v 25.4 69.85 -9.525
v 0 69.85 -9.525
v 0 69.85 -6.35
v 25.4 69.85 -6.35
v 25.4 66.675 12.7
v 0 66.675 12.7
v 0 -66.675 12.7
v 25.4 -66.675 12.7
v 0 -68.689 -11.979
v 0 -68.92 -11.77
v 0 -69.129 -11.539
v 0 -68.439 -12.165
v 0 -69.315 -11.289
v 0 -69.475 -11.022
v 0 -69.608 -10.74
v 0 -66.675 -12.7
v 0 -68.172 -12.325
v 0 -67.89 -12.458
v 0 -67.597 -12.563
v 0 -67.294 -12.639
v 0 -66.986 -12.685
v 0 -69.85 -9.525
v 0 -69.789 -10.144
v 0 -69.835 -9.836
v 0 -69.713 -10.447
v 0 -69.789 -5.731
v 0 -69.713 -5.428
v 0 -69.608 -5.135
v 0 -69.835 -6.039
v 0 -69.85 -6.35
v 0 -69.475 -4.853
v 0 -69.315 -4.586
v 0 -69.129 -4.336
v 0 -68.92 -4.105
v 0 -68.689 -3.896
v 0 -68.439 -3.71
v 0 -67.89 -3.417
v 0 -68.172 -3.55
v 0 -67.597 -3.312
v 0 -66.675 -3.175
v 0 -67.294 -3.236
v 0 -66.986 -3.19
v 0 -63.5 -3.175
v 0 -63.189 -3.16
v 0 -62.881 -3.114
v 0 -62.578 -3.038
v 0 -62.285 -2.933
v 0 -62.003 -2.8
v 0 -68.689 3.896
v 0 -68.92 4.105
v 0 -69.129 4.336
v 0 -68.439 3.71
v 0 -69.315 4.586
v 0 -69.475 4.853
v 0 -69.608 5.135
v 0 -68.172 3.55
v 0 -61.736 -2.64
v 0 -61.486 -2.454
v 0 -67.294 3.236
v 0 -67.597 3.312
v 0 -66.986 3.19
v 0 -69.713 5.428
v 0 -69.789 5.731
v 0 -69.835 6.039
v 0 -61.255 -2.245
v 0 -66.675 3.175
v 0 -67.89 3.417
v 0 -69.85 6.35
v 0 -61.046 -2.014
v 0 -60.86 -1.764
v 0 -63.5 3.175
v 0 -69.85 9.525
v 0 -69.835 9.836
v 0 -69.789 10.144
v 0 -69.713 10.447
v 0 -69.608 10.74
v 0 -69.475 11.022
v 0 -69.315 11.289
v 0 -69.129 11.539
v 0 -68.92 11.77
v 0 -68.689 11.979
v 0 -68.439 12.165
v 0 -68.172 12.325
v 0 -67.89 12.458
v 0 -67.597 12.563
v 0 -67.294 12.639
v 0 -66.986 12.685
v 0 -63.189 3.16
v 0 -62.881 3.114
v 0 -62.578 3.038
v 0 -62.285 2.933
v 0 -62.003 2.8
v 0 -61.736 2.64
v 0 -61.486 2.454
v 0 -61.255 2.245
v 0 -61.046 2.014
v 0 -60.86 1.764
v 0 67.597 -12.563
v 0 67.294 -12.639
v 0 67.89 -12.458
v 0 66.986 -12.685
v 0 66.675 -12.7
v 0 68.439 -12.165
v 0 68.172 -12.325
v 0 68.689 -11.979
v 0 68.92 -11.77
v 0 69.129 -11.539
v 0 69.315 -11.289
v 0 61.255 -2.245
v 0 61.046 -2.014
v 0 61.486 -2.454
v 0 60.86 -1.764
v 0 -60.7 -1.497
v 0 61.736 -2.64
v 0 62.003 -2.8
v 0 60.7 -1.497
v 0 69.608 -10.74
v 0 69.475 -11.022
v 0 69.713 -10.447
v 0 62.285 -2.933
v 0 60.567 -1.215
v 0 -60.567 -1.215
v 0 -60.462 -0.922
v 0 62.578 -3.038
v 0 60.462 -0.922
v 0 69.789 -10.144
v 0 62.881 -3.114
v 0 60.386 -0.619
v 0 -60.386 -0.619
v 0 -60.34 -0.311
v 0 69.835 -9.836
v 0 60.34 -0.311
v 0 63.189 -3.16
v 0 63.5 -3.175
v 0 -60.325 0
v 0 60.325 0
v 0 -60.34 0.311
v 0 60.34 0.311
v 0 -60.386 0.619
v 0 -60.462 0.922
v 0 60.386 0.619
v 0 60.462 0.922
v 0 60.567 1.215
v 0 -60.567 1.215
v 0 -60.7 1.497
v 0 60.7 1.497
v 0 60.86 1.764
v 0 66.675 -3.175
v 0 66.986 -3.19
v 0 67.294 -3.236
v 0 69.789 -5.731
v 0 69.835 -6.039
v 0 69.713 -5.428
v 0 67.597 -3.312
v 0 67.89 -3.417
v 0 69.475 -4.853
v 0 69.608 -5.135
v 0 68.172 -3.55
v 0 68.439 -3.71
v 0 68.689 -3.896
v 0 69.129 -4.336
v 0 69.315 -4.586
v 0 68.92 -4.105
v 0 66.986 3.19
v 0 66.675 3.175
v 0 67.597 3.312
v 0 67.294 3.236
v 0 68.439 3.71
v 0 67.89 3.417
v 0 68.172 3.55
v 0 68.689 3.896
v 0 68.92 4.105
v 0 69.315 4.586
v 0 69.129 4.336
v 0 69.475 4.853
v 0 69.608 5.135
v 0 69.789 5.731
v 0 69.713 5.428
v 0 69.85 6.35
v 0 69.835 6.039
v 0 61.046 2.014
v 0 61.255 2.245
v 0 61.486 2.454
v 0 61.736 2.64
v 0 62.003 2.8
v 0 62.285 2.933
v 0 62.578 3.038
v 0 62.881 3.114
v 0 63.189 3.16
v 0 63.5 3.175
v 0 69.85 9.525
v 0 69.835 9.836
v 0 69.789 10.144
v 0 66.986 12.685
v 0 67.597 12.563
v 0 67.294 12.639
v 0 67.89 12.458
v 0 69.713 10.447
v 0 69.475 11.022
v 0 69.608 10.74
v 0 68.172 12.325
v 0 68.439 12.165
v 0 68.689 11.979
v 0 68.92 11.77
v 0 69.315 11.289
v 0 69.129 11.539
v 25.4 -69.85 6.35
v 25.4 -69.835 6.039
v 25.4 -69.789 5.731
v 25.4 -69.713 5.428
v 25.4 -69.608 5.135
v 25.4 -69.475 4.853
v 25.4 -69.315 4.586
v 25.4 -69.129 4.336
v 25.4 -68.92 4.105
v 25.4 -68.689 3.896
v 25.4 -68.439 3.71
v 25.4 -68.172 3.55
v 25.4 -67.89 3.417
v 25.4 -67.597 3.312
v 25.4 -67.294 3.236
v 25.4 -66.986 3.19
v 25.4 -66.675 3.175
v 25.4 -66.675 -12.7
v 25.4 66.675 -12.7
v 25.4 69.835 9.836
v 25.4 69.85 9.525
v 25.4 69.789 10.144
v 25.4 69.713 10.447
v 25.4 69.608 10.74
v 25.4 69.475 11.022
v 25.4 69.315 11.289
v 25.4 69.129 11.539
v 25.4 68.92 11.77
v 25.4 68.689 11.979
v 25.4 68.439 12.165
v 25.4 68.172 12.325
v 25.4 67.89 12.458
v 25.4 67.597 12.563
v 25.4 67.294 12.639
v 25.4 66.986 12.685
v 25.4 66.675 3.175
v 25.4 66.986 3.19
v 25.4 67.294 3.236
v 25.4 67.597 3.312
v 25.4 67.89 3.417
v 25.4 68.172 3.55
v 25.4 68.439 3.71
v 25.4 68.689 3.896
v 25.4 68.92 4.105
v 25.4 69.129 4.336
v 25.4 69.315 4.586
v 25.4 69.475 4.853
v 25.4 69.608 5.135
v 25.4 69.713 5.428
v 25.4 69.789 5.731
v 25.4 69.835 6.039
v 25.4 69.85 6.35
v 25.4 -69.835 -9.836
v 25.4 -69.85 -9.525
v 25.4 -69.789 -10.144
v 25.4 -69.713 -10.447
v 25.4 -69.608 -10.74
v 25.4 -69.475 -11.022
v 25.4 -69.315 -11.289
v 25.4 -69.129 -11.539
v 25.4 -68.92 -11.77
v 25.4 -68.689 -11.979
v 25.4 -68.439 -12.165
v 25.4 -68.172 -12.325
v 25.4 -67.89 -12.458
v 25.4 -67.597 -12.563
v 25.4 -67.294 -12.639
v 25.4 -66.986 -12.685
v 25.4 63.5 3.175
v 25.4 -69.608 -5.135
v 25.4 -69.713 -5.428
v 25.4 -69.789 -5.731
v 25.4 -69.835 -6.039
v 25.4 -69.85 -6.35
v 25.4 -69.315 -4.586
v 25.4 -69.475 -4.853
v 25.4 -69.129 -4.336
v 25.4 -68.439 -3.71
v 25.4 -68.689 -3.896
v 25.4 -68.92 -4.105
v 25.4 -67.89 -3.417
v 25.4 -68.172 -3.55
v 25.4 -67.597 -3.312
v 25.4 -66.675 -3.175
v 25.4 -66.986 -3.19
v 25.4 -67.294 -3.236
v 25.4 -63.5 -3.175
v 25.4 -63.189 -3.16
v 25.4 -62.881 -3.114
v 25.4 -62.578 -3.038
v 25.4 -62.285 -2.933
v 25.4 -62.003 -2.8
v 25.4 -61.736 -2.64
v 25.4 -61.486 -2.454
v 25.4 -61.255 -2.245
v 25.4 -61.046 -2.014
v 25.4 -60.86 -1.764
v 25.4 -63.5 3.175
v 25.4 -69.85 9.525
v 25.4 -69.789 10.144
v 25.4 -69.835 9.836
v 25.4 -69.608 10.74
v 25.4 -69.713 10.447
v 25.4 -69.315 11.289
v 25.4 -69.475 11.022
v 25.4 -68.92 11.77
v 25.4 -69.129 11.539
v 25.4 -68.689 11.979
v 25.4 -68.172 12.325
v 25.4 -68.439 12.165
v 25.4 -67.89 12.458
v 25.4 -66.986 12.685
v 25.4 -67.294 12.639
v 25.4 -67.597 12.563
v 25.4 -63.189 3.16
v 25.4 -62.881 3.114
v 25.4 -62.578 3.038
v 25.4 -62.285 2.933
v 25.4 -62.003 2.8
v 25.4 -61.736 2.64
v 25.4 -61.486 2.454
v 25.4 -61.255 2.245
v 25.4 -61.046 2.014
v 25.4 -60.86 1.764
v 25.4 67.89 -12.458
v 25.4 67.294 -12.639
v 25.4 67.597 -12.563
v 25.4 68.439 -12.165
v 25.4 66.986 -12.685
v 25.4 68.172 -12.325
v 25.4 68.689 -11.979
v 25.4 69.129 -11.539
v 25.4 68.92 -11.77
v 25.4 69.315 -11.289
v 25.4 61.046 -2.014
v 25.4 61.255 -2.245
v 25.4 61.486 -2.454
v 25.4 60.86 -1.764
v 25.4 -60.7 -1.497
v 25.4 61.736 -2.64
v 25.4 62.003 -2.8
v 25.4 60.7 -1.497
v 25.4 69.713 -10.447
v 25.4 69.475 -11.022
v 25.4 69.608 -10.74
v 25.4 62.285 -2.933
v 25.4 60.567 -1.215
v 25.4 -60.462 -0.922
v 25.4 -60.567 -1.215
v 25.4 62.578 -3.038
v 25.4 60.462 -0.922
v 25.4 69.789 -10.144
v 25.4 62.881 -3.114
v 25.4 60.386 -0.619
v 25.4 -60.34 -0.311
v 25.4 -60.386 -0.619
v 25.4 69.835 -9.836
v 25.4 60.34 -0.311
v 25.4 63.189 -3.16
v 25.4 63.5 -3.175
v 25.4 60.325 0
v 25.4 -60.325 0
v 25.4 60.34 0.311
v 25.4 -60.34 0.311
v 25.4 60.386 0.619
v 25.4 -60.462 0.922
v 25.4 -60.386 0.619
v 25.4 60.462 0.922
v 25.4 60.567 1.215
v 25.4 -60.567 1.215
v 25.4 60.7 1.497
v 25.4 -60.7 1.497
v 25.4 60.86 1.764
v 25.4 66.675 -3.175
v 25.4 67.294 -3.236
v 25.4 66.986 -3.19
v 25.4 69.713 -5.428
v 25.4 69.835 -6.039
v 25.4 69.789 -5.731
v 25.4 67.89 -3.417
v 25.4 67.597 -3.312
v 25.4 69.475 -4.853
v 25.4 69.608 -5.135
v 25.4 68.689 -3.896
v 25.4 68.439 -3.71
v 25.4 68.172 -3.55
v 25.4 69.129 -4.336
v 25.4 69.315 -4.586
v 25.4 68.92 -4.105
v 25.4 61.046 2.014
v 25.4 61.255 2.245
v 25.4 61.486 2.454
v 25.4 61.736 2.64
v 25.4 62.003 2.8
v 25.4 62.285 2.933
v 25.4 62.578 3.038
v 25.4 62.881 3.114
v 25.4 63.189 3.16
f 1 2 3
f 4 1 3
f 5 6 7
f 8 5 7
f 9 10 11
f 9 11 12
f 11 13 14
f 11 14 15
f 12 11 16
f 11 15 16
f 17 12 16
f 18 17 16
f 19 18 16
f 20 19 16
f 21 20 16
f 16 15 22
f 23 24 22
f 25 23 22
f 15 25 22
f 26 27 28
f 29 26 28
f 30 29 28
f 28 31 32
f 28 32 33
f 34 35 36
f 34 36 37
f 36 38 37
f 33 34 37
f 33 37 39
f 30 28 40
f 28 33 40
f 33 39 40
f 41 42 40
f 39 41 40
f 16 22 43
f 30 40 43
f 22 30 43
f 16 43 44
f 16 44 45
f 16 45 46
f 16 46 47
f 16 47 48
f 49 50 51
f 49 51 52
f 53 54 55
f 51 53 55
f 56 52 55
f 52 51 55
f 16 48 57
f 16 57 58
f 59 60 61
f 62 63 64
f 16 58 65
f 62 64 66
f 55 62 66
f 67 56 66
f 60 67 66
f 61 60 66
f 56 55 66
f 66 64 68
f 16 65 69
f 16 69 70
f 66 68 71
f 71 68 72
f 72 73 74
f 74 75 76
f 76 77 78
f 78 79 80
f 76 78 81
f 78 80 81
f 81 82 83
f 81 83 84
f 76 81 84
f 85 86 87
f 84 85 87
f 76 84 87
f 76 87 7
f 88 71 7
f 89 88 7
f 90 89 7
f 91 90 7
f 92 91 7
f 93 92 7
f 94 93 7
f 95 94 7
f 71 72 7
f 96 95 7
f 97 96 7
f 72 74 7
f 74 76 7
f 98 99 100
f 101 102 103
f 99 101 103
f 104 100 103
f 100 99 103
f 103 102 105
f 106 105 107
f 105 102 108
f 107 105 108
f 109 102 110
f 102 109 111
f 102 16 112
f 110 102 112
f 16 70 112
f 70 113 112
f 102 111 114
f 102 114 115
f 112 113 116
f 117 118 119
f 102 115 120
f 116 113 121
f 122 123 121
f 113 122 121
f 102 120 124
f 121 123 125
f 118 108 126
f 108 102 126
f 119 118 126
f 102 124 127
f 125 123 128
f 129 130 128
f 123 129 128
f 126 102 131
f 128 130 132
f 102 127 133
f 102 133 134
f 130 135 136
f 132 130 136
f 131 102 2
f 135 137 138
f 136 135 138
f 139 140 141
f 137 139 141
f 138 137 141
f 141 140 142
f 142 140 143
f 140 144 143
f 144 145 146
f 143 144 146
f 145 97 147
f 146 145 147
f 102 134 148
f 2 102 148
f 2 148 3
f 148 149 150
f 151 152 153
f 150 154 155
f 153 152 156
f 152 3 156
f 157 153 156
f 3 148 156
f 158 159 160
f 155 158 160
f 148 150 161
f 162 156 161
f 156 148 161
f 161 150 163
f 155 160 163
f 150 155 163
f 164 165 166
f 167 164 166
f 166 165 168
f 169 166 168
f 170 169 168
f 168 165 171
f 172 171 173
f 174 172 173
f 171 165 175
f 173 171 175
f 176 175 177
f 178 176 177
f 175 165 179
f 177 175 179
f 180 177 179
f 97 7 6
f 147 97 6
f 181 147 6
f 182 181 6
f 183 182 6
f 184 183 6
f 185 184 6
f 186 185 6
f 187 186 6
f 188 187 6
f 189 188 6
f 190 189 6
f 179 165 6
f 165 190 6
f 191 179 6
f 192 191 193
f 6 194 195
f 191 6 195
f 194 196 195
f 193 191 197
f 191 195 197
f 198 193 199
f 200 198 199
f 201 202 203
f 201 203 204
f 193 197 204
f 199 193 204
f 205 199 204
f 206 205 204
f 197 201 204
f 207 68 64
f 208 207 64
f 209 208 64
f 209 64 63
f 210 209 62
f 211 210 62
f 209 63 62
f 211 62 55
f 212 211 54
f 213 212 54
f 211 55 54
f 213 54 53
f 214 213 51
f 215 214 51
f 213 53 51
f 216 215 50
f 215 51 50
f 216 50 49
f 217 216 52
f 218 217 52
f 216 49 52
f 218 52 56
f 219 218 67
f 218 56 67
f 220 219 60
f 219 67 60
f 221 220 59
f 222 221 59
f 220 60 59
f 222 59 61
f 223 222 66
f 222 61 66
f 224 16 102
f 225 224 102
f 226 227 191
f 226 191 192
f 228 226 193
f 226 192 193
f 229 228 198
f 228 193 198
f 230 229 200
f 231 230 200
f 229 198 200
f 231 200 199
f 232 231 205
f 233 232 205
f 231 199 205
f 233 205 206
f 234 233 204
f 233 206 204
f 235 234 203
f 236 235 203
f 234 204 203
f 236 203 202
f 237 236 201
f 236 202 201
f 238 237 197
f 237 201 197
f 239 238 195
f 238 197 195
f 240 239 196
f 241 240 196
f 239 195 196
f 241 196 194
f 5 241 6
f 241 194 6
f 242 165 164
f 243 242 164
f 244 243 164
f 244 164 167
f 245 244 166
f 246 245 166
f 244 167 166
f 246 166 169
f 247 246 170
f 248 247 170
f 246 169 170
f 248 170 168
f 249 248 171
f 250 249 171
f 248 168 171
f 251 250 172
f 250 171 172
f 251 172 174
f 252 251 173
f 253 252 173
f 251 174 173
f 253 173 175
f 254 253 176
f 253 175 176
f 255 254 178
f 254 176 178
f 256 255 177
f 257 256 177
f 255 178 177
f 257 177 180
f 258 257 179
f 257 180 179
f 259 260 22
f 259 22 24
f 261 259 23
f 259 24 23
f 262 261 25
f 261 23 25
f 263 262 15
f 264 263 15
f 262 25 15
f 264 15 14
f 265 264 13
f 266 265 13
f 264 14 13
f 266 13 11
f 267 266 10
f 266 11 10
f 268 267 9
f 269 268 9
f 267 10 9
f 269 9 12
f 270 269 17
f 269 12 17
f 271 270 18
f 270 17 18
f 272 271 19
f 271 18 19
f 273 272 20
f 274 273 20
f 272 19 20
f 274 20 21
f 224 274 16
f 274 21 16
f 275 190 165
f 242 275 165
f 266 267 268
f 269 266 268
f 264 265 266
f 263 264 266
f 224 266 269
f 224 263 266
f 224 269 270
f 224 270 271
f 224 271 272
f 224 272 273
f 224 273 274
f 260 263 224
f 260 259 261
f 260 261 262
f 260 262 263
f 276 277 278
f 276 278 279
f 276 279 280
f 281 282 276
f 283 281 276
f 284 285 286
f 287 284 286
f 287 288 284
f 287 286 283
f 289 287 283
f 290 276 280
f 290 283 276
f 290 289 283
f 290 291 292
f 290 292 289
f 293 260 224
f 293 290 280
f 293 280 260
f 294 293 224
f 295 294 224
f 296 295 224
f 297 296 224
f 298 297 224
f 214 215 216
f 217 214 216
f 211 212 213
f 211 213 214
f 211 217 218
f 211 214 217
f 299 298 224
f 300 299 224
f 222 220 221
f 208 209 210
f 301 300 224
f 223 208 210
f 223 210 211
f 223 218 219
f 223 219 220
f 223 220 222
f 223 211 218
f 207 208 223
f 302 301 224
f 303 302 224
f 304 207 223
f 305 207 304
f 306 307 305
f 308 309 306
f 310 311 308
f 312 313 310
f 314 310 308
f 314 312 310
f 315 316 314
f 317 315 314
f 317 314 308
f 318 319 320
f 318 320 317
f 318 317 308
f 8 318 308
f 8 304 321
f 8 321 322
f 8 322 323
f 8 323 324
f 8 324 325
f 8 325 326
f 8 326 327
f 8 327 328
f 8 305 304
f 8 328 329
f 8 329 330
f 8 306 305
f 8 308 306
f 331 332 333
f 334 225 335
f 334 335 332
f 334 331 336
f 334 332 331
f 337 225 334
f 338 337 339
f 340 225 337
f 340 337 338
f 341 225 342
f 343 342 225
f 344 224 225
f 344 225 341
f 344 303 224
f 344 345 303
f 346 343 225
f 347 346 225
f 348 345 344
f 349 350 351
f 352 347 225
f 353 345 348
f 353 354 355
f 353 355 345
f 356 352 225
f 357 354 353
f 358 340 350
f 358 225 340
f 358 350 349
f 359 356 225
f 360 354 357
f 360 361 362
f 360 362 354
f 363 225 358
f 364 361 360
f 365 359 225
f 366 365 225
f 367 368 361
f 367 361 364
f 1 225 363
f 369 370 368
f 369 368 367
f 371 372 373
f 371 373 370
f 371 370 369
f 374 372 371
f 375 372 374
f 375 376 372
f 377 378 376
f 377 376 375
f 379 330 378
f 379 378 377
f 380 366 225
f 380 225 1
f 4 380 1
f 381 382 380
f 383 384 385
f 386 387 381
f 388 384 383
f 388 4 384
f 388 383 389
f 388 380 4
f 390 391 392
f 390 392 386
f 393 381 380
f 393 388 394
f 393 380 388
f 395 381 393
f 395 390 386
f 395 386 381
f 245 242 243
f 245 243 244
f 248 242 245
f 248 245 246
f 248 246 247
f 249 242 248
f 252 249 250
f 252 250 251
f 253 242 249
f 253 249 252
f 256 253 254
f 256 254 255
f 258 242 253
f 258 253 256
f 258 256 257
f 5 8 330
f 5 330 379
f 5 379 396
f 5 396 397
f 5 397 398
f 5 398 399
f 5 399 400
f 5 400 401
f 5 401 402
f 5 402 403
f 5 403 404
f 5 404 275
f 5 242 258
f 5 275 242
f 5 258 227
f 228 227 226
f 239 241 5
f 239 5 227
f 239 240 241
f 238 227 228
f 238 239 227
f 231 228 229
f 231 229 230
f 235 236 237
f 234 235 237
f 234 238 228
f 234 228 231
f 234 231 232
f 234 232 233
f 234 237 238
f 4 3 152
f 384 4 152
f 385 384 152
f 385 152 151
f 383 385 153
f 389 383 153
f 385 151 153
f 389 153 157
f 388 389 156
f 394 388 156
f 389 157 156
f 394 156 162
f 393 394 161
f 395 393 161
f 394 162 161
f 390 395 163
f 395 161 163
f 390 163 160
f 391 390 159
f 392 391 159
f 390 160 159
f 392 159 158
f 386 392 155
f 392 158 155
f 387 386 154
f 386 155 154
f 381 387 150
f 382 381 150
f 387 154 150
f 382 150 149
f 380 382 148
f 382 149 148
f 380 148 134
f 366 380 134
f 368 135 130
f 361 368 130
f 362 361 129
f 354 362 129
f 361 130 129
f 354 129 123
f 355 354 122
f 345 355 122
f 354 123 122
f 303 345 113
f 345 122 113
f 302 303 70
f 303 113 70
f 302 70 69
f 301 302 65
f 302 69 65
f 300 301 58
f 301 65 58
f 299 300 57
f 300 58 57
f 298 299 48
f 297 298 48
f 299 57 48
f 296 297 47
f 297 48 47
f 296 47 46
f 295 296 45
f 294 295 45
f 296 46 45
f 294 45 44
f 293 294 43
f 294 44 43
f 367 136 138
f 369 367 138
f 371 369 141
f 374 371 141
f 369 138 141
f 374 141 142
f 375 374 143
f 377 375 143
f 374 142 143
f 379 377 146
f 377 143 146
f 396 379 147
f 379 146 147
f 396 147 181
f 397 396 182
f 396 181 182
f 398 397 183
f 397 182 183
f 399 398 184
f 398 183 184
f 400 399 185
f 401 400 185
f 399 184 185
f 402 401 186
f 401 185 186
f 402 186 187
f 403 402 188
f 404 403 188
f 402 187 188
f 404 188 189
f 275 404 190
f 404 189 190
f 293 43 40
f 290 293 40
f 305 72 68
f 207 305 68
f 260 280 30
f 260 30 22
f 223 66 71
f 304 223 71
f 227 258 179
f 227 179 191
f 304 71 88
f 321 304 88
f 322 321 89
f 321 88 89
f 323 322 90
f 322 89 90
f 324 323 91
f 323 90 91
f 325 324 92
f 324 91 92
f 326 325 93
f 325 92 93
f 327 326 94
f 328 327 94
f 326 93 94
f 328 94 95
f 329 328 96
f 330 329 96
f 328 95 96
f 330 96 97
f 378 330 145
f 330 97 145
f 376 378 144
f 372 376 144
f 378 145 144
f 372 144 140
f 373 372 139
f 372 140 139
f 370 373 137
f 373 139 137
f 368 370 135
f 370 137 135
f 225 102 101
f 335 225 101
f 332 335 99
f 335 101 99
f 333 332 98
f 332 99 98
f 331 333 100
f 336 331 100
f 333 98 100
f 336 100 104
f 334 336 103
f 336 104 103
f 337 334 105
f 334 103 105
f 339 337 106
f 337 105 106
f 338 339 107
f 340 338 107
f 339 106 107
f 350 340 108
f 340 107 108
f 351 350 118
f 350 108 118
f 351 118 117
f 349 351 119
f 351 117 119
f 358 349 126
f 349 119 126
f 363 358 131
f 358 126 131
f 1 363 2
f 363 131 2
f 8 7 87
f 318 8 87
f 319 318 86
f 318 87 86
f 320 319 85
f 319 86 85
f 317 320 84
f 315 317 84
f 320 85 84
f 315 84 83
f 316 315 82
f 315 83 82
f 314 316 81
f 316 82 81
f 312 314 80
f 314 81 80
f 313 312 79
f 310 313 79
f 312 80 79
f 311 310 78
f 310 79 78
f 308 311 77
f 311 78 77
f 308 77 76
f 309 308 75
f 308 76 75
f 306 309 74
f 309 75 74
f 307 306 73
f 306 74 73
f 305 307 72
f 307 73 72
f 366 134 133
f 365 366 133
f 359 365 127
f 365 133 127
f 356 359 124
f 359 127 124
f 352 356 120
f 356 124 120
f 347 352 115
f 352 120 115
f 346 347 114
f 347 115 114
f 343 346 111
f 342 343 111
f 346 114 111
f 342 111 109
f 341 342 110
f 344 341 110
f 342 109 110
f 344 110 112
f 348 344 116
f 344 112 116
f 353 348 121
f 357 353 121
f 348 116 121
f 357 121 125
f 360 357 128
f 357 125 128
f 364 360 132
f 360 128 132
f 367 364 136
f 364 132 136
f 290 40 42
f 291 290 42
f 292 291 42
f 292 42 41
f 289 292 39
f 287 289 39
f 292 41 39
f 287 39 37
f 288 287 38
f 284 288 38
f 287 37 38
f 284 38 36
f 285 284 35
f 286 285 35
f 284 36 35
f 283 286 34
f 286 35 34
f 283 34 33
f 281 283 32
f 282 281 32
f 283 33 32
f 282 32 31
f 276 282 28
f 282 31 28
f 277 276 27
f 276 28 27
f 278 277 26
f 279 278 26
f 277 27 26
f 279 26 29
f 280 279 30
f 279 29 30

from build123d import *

# Parameters (mm, degrees)
F1_DEPTH = 25.4


with BuildPart() as f1:
    # F0 (on Right) → F1 (new body)
    with BuildSketch(Plane.YZ):
        with BuildLine():
            Line((66.675, 12.7), (-66.675, 12.7))
            ThreePointArc((-66.675, 12.7), (-68.920064, 11.770064), (-69.85, 9.525))
            Line((-69.85, 9.525), (-69.85, 6.35))
            ThreePointArc((-69.85, 6.35), (-68.920064, 4.104936), (-66.675, 3.175))
            Line((-66.675, 3.175), (-63.5, 3.175))
            ThreePointArc((-63.5, 3.175), (-61.254936, 2.245064), (-60.325, 0))
            ThreePointArc((-60.325, 0), (-61.254936, -2.245064), (-63.5, -3.175))
            Line((-63.5, -3.175), (-66.675, -3.175))
            ThreePointArc((-66.675, -3.175), (-68.920064, -4.104936), (-69.85, -6.35))
            Line((-69.85, -6.35), (-69.85, -9.525))
            ThreePointArc((-69.85, -9.525), (-68.920064, -11.770064), (-66.675, -12.7))
            Line((-66.675, -12.7), (66.675, -12.7))
            ThreePointArc((66.675, -12.7), (68.920064, -11.770064), (69.85, -9.525))
            Line((69.85, -9.525), (69.85, -6.35))
            ThreePointArc((69.85, -6.35), (68.920064, -4.104936), (66.675, -3.175))
            Line((66.675, -3.175), (63.5, -3.175))
            ThreePointArc((63.5, -3.175), (61.254936, -2.245064), (60.325, 0))
            ThreePointArc((60.325, 0), (61.254936, 2.245064), (63.5, 3.175))
            Line((63.5, 3.175), (66.675, 3.175))
            ThreePointArc((66.675, 3.175), (68.920064, 4.104936), (69.85, 6.35))
            Line((69.85, 6.35), (69.85, 9.525))
            ThreePointArc((69.85, 9.525), (68.920064, 11.770064), (66.675, 12.7))
        make_face()
    extrude(amount=F1_DEPTH)


solid = f1.part
